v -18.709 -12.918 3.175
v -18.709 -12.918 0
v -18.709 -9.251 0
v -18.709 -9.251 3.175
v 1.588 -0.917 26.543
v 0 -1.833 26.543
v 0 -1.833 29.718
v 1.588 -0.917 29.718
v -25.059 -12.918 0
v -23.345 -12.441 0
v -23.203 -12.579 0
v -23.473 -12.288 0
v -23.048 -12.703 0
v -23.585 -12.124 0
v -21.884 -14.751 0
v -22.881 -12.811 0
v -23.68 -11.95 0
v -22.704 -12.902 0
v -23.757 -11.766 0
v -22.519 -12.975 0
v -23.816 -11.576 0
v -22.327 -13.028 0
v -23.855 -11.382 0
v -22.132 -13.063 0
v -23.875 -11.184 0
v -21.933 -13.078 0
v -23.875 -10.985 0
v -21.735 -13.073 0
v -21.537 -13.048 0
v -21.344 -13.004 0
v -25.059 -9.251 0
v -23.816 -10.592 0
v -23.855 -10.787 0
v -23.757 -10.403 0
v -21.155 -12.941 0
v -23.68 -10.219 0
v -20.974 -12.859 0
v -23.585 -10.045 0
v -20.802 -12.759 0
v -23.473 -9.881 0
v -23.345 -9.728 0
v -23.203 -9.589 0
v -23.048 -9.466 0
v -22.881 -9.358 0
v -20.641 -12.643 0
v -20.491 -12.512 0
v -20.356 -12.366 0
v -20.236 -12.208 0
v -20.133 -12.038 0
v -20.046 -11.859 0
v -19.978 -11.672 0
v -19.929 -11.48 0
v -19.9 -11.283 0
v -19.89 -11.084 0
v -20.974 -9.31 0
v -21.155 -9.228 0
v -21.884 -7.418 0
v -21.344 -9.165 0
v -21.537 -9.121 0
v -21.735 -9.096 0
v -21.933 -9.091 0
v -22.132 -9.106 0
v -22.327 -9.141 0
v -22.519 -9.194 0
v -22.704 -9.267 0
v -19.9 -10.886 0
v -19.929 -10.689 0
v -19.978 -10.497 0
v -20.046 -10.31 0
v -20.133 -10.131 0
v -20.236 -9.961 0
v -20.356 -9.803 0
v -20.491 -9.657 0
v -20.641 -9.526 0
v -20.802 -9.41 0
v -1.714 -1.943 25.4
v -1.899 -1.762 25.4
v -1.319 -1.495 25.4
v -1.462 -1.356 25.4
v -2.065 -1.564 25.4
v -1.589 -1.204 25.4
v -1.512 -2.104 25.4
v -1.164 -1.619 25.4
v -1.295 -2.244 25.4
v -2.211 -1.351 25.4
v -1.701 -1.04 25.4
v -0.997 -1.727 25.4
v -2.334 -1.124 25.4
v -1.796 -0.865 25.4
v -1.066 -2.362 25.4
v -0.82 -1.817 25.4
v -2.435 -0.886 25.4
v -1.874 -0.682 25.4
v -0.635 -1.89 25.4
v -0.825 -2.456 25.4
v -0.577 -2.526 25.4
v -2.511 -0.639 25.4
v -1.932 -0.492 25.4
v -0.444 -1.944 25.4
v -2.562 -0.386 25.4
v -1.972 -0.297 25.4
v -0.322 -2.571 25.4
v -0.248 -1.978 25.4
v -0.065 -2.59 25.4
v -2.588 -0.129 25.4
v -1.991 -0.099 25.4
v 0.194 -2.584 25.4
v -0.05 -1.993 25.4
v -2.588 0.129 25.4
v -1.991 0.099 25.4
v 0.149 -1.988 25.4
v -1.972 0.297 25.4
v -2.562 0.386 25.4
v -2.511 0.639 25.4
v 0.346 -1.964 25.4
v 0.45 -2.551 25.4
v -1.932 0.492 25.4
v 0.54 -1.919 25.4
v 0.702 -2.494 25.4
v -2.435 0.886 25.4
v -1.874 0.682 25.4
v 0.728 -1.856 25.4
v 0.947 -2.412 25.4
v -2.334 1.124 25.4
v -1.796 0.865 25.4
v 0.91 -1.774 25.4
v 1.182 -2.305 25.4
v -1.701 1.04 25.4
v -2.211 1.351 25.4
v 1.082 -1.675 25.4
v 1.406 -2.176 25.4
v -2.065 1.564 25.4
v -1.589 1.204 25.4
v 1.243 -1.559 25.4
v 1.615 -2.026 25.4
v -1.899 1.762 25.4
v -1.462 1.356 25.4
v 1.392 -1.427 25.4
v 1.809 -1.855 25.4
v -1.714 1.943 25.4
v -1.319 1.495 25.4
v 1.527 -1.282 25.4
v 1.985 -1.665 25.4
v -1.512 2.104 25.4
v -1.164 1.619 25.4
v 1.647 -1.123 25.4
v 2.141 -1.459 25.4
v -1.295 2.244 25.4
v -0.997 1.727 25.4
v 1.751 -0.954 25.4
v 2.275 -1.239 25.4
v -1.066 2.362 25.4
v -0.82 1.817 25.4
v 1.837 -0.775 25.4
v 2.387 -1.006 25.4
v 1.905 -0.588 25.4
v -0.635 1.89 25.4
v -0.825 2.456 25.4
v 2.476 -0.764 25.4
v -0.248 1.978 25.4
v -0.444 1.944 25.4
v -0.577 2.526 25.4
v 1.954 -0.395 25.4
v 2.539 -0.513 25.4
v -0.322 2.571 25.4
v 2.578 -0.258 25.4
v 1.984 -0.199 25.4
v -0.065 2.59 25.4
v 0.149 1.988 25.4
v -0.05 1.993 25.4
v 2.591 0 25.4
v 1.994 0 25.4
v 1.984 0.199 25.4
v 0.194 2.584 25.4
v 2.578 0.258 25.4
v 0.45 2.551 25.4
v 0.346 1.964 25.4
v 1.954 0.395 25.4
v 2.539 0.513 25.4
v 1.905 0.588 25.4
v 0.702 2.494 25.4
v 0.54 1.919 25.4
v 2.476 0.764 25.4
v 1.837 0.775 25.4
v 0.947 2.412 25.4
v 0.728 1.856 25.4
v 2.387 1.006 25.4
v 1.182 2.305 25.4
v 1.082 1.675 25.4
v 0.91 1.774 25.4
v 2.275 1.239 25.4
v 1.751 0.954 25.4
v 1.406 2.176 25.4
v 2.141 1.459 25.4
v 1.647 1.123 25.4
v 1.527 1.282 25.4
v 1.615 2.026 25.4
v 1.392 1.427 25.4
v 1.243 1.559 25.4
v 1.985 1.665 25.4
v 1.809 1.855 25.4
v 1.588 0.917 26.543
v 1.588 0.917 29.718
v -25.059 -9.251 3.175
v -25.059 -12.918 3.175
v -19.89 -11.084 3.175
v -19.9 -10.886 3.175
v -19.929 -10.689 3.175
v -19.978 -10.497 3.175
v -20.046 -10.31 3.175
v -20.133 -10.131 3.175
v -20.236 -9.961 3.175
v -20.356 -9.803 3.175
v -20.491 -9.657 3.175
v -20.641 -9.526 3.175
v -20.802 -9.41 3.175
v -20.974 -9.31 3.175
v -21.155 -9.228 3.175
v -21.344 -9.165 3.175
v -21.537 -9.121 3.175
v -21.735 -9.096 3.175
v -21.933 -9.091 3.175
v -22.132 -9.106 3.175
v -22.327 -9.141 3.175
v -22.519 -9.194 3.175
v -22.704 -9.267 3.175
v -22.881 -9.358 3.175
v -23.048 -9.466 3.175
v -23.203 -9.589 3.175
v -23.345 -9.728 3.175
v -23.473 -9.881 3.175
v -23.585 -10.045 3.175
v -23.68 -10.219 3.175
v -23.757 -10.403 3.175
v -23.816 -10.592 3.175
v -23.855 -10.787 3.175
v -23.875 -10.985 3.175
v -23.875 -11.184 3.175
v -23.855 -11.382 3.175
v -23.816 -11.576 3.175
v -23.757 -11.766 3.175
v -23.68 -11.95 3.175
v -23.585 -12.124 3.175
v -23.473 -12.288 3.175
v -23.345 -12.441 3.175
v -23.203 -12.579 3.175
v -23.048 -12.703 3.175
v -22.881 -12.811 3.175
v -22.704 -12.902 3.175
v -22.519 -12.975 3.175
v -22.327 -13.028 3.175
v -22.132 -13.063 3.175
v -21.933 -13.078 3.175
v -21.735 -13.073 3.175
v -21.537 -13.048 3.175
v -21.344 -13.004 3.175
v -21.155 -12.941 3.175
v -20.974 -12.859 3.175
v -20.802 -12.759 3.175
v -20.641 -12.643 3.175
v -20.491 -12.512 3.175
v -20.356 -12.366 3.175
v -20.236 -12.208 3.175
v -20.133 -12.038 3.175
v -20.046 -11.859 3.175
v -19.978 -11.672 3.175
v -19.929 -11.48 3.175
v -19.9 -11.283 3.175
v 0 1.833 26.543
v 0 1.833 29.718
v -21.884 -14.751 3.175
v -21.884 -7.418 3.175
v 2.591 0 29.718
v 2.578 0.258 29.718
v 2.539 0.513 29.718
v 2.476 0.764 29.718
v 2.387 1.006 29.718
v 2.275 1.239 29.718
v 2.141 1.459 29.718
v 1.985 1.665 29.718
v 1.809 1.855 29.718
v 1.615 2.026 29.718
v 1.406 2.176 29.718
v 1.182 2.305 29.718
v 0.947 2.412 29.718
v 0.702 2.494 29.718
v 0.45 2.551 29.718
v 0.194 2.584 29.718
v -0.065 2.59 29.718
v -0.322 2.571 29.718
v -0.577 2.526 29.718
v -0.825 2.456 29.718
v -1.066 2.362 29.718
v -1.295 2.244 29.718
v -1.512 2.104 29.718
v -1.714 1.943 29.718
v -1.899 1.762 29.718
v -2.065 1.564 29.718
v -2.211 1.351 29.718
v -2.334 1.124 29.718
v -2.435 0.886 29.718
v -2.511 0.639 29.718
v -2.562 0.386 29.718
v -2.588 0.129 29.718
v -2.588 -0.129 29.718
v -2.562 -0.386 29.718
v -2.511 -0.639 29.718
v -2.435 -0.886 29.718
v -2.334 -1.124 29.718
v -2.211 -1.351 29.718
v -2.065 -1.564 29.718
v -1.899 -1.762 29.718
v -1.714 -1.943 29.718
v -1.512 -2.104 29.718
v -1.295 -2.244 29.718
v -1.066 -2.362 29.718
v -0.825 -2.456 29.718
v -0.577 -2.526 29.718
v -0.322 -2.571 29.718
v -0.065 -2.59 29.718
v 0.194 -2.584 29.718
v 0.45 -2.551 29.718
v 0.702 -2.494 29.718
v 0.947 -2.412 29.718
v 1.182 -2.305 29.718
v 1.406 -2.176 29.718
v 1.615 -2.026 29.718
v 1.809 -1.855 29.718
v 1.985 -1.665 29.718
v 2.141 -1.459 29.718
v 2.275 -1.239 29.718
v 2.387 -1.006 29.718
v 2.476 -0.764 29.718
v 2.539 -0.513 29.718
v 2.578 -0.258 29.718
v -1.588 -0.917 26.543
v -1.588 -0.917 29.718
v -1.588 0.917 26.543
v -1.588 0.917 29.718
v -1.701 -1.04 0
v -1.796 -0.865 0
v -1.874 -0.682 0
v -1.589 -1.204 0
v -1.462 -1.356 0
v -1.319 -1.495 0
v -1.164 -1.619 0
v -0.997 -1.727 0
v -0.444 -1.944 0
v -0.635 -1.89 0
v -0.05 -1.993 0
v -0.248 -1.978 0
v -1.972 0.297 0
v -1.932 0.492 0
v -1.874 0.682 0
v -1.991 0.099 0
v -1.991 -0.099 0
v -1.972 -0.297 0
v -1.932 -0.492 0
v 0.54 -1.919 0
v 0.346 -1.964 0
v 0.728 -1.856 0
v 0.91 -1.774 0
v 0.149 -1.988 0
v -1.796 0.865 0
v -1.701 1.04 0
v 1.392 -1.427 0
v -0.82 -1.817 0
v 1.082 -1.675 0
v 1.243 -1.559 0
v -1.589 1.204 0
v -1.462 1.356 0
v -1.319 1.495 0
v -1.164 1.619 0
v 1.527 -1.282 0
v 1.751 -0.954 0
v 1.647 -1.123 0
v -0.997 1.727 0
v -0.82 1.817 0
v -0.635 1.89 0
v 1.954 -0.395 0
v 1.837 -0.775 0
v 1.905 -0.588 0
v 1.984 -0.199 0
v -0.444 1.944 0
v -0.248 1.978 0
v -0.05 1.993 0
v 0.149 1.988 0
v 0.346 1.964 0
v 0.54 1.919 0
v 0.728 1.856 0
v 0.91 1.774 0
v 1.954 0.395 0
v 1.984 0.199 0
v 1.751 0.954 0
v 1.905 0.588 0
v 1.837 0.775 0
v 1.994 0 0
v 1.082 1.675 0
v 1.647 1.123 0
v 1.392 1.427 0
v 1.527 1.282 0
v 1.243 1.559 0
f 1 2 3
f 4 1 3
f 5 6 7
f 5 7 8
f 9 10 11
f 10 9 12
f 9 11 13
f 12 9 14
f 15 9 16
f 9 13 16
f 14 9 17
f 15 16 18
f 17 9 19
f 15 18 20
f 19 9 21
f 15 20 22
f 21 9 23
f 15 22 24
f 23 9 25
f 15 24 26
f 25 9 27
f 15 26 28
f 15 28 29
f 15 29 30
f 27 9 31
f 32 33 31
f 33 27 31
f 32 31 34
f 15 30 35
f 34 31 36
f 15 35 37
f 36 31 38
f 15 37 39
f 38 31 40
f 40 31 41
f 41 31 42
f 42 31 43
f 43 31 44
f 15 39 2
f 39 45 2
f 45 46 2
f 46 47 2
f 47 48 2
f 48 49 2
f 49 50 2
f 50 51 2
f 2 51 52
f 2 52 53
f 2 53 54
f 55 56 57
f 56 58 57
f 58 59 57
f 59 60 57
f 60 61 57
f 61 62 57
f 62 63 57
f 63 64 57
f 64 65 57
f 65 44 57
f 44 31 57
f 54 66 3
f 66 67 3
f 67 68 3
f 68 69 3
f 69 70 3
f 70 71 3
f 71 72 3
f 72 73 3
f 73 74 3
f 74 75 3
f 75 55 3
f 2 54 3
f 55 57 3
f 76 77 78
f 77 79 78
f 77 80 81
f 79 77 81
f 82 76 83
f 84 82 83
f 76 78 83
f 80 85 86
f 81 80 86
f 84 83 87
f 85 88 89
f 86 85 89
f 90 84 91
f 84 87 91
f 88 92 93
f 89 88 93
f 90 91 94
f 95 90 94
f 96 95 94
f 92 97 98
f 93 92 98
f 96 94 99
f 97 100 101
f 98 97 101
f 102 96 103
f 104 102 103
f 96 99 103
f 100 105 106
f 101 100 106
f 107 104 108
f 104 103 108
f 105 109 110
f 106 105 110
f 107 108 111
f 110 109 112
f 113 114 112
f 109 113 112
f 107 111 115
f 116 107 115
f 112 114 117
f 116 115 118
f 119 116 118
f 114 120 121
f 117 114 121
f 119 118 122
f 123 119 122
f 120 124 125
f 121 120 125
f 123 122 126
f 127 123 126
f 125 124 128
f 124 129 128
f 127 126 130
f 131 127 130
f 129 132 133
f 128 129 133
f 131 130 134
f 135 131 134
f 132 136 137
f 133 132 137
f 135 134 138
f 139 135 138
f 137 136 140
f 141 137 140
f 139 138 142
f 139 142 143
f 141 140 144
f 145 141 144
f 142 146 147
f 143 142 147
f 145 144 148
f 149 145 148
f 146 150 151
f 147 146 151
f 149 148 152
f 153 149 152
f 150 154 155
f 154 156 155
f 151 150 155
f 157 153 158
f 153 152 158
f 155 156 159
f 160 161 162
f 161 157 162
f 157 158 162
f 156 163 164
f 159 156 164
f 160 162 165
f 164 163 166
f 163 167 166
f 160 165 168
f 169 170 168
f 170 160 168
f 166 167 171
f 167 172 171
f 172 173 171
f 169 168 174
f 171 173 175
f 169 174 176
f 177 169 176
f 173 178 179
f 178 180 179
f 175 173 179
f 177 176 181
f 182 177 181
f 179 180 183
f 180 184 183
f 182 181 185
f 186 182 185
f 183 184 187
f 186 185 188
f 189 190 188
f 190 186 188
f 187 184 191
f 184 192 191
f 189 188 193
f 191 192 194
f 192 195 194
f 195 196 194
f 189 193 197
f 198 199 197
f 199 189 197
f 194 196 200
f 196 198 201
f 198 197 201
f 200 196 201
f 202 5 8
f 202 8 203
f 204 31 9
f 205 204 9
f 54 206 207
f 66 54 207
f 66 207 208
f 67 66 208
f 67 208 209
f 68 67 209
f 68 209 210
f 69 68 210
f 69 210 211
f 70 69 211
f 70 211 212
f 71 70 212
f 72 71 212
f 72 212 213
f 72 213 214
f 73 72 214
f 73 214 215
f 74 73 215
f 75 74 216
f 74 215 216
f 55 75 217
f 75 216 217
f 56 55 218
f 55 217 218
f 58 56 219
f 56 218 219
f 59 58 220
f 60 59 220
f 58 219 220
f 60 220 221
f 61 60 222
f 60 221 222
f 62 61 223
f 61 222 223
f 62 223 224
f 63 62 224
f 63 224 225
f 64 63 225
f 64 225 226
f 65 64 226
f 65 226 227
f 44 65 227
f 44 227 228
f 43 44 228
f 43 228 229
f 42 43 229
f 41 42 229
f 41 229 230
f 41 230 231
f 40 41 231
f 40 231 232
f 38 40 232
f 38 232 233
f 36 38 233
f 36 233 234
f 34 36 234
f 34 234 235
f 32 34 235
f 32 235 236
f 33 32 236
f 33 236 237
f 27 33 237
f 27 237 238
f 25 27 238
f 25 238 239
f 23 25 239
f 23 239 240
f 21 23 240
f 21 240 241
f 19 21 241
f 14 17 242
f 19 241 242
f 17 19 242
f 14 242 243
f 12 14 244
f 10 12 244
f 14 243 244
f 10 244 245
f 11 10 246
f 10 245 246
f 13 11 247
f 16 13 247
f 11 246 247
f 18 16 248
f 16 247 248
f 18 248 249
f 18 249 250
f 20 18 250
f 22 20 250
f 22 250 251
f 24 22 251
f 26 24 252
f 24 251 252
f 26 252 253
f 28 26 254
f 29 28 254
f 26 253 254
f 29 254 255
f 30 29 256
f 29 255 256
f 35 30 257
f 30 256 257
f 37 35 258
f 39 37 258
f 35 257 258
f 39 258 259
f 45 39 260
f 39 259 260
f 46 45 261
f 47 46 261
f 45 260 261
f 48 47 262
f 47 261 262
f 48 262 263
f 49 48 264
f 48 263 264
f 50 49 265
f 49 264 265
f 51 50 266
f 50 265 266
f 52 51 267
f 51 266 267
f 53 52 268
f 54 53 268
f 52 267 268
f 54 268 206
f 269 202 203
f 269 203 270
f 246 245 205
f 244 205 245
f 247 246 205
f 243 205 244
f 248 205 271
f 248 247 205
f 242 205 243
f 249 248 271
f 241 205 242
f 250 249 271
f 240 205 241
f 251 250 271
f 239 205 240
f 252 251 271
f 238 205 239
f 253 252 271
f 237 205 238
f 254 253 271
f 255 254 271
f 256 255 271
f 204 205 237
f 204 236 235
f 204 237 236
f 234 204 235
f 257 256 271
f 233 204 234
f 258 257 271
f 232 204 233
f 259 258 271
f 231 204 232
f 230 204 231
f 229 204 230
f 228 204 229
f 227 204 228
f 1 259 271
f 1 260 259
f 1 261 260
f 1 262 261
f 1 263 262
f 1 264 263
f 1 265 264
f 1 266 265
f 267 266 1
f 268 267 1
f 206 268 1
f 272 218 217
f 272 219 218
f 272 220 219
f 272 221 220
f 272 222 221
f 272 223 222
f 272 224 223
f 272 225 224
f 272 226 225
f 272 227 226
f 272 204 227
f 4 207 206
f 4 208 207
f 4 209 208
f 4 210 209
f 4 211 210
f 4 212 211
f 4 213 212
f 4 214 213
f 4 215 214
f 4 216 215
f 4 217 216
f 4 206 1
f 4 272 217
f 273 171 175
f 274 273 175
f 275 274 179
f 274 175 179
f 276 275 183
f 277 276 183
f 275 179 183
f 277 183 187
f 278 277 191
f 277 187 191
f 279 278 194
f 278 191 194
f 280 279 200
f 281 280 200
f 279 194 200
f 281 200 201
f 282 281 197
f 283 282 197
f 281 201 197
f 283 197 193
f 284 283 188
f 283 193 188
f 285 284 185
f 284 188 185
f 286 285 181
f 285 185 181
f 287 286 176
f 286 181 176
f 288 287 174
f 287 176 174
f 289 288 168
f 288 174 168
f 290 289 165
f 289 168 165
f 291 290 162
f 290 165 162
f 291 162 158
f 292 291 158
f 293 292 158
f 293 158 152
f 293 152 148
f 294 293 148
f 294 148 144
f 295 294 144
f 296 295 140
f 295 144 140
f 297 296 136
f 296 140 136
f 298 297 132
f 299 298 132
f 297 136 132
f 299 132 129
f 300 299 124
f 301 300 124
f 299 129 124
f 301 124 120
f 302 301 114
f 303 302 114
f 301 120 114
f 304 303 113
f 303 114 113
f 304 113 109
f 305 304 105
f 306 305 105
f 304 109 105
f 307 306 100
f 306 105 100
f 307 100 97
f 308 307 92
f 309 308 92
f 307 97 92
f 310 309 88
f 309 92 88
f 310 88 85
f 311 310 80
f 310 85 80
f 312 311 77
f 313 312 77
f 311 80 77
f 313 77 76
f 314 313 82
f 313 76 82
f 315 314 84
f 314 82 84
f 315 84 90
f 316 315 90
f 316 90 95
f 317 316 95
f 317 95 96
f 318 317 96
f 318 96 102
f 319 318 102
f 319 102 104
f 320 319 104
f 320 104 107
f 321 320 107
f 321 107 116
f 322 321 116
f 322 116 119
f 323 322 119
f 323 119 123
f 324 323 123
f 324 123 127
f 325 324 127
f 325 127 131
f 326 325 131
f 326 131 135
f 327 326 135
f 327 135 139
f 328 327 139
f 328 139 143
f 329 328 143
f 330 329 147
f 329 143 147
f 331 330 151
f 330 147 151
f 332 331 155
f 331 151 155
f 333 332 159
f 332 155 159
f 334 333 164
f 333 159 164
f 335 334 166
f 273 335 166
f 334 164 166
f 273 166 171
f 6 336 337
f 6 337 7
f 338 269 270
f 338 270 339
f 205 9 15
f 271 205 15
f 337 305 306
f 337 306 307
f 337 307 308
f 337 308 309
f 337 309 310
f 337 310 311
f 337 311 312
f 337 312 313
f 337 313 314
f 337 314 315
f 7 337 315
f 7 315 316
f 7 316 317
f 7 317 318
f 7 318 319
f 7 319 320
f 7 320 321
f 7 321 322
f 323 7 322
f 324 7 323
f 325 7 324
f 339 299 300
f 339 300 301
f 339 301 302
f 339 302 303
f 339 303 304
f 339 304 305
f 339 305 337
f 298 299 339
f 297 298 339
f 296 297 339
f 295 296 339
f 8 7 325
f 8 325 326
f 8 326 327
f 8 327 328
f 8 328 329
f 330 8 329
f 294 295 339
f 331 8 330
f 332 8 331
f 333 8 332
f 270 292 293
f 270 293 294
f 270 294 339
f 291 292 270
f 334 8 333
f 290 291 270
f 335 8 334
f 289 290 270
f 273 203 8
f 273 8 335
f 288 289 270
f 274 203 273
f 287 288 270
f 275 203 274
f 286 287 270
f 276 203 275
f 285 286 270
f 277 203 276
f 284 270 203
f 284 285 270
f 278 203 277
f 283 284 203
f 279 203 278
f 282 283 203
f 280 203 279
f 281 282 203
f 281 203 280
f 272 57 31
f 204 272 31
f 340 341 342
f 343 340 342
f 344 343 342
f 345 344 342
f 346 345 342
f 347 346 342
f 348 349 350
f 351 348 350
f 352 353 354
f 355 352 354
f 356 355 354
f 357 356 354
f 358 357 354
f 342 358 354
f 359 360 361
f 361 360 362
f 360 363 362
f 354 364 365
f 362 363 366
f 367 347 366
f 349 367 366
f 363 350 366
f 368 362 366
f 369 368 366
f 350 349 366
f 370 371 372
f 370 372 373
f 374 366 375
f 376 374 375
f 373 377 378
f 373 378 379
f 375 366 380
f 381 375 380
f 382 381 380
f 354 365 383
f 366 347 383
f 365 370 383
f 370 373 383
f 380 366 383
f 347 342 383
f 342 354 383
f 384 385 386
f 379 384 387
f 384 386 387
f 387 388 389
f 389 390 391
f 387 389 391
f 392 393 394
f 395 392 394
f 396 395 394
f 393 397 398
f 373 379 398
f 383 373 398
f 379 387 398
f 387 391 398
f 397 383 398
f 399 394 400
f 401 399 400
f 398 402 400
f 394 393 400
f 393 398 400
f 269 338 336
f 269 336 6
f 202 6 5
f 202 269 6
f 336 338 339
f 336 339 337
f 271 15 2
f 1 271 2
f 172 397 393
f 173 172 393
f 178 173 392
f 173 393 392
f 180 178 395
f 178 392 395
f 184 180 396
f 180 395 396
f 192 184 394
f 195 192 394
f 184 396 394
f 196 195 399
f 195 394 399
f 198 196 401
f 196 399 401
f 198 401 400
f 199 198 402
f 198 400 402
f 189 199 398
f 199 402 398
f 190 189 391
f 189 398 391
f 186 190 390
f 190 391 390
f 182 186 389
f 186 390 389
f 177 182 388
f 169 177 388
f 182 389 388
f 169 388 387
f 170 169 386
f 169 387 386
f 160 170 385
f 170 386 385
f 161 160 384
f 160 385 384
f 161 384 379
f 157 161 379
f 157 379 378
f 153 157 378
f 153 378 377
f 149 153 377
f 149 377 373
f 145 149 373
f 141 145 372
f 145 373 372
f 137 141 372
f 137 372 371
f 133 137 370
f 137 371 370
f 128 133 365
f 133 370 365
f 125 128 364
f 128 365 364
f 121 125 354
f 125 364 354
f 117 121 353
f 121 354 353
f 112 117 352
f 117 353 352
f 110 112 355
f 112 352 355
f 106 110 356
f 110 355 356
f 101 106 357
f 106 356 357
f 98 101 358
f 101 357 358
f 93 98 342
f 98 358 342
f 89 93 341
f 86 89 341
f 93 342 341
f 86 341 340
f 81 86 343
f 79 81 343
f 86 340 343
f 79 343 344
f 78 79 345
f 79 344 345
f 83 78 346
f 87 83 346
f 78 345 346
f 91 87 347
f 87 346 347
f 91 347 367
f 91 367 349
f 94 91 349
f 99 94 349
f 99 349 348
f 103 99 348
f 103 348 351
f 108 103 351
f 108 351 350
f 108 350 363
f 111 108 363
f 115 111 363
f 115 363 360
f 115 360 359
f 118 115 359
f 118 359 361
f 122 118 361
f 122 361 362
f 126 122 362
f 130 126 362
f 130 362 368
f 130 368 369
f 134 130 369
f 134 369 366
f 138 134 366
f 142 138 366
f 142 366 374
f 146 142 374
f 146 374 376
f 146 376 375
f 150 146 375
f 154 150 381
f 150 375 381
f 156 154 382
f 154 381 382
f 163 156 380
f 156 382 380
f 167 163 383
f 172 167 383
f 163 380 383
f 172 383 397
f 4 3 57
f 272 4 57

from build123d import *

# Parameters (mm, degrees)
F0_R     = 1.9939
F1_DEPTH = 25.4
F2_R     = 2.5908
F2_R_2   = 1.9939
F3_DEPTH = 4.318
F5_DEPTH = 3.175
F7_DEPTH = 3.175
F8_R     = 1.9939
F9_DEPTH = 6.35


with BuildPart() as f1:
    # F0 (on Top) → F1 (new body)
    with BuildSketch(Plane.XY):
        Circle(F0_R)
    extrude(amount=F1_DEPTH)

    # F2 (on face) → F3 (join)
    with BuildSketch(Plane.XY.offset(25.4)):
        Circle(F2_R)
        Circle(F2_R_2, mode=Mode.SUBTRACT)
        Circle(F2_R_2)
    extrude(amount=F3_DEPTH)

    # F4 (on face) → F5 (cut)
    with BuildSketch(Plane.XY.offset(29.718)):
        Polygon((1.5875, -0.916544), (1.5875, 0.916544), (0, 1.833087), (-1.5875, 0.916544), (-1.5875, -0.916544), (0, -1.833087), align=None)
    extrude(amount=-F5_DEPTH, mode=Mode.SUBTRACT)


with BuildPart() as f7:
    # F6 (on Top) → F7 (new body)
    with BuildSketch(Plane.XY):
        Polygon((-18.708706, -12.917549), (-18.708706, -9.251374), (-21.883706, -7.418287), (-25.058706, -9.251374), (-25.058706, -12.917549), (-21.883706, -14.750636), align=None)
    extrude(amount=F7_DEPTH)

    # F8 (on face) → F9 (cut)
    with BuildSketch(Plane.XY.offset(3.175)):
        with Locations((-21.883706, -11.084462)):
            Circle(F8_R)
    extrude(amount=-F9_DEPTH, mode=Mode.SUBTRACT)


solid = Compound([f1.part, f7.part])
